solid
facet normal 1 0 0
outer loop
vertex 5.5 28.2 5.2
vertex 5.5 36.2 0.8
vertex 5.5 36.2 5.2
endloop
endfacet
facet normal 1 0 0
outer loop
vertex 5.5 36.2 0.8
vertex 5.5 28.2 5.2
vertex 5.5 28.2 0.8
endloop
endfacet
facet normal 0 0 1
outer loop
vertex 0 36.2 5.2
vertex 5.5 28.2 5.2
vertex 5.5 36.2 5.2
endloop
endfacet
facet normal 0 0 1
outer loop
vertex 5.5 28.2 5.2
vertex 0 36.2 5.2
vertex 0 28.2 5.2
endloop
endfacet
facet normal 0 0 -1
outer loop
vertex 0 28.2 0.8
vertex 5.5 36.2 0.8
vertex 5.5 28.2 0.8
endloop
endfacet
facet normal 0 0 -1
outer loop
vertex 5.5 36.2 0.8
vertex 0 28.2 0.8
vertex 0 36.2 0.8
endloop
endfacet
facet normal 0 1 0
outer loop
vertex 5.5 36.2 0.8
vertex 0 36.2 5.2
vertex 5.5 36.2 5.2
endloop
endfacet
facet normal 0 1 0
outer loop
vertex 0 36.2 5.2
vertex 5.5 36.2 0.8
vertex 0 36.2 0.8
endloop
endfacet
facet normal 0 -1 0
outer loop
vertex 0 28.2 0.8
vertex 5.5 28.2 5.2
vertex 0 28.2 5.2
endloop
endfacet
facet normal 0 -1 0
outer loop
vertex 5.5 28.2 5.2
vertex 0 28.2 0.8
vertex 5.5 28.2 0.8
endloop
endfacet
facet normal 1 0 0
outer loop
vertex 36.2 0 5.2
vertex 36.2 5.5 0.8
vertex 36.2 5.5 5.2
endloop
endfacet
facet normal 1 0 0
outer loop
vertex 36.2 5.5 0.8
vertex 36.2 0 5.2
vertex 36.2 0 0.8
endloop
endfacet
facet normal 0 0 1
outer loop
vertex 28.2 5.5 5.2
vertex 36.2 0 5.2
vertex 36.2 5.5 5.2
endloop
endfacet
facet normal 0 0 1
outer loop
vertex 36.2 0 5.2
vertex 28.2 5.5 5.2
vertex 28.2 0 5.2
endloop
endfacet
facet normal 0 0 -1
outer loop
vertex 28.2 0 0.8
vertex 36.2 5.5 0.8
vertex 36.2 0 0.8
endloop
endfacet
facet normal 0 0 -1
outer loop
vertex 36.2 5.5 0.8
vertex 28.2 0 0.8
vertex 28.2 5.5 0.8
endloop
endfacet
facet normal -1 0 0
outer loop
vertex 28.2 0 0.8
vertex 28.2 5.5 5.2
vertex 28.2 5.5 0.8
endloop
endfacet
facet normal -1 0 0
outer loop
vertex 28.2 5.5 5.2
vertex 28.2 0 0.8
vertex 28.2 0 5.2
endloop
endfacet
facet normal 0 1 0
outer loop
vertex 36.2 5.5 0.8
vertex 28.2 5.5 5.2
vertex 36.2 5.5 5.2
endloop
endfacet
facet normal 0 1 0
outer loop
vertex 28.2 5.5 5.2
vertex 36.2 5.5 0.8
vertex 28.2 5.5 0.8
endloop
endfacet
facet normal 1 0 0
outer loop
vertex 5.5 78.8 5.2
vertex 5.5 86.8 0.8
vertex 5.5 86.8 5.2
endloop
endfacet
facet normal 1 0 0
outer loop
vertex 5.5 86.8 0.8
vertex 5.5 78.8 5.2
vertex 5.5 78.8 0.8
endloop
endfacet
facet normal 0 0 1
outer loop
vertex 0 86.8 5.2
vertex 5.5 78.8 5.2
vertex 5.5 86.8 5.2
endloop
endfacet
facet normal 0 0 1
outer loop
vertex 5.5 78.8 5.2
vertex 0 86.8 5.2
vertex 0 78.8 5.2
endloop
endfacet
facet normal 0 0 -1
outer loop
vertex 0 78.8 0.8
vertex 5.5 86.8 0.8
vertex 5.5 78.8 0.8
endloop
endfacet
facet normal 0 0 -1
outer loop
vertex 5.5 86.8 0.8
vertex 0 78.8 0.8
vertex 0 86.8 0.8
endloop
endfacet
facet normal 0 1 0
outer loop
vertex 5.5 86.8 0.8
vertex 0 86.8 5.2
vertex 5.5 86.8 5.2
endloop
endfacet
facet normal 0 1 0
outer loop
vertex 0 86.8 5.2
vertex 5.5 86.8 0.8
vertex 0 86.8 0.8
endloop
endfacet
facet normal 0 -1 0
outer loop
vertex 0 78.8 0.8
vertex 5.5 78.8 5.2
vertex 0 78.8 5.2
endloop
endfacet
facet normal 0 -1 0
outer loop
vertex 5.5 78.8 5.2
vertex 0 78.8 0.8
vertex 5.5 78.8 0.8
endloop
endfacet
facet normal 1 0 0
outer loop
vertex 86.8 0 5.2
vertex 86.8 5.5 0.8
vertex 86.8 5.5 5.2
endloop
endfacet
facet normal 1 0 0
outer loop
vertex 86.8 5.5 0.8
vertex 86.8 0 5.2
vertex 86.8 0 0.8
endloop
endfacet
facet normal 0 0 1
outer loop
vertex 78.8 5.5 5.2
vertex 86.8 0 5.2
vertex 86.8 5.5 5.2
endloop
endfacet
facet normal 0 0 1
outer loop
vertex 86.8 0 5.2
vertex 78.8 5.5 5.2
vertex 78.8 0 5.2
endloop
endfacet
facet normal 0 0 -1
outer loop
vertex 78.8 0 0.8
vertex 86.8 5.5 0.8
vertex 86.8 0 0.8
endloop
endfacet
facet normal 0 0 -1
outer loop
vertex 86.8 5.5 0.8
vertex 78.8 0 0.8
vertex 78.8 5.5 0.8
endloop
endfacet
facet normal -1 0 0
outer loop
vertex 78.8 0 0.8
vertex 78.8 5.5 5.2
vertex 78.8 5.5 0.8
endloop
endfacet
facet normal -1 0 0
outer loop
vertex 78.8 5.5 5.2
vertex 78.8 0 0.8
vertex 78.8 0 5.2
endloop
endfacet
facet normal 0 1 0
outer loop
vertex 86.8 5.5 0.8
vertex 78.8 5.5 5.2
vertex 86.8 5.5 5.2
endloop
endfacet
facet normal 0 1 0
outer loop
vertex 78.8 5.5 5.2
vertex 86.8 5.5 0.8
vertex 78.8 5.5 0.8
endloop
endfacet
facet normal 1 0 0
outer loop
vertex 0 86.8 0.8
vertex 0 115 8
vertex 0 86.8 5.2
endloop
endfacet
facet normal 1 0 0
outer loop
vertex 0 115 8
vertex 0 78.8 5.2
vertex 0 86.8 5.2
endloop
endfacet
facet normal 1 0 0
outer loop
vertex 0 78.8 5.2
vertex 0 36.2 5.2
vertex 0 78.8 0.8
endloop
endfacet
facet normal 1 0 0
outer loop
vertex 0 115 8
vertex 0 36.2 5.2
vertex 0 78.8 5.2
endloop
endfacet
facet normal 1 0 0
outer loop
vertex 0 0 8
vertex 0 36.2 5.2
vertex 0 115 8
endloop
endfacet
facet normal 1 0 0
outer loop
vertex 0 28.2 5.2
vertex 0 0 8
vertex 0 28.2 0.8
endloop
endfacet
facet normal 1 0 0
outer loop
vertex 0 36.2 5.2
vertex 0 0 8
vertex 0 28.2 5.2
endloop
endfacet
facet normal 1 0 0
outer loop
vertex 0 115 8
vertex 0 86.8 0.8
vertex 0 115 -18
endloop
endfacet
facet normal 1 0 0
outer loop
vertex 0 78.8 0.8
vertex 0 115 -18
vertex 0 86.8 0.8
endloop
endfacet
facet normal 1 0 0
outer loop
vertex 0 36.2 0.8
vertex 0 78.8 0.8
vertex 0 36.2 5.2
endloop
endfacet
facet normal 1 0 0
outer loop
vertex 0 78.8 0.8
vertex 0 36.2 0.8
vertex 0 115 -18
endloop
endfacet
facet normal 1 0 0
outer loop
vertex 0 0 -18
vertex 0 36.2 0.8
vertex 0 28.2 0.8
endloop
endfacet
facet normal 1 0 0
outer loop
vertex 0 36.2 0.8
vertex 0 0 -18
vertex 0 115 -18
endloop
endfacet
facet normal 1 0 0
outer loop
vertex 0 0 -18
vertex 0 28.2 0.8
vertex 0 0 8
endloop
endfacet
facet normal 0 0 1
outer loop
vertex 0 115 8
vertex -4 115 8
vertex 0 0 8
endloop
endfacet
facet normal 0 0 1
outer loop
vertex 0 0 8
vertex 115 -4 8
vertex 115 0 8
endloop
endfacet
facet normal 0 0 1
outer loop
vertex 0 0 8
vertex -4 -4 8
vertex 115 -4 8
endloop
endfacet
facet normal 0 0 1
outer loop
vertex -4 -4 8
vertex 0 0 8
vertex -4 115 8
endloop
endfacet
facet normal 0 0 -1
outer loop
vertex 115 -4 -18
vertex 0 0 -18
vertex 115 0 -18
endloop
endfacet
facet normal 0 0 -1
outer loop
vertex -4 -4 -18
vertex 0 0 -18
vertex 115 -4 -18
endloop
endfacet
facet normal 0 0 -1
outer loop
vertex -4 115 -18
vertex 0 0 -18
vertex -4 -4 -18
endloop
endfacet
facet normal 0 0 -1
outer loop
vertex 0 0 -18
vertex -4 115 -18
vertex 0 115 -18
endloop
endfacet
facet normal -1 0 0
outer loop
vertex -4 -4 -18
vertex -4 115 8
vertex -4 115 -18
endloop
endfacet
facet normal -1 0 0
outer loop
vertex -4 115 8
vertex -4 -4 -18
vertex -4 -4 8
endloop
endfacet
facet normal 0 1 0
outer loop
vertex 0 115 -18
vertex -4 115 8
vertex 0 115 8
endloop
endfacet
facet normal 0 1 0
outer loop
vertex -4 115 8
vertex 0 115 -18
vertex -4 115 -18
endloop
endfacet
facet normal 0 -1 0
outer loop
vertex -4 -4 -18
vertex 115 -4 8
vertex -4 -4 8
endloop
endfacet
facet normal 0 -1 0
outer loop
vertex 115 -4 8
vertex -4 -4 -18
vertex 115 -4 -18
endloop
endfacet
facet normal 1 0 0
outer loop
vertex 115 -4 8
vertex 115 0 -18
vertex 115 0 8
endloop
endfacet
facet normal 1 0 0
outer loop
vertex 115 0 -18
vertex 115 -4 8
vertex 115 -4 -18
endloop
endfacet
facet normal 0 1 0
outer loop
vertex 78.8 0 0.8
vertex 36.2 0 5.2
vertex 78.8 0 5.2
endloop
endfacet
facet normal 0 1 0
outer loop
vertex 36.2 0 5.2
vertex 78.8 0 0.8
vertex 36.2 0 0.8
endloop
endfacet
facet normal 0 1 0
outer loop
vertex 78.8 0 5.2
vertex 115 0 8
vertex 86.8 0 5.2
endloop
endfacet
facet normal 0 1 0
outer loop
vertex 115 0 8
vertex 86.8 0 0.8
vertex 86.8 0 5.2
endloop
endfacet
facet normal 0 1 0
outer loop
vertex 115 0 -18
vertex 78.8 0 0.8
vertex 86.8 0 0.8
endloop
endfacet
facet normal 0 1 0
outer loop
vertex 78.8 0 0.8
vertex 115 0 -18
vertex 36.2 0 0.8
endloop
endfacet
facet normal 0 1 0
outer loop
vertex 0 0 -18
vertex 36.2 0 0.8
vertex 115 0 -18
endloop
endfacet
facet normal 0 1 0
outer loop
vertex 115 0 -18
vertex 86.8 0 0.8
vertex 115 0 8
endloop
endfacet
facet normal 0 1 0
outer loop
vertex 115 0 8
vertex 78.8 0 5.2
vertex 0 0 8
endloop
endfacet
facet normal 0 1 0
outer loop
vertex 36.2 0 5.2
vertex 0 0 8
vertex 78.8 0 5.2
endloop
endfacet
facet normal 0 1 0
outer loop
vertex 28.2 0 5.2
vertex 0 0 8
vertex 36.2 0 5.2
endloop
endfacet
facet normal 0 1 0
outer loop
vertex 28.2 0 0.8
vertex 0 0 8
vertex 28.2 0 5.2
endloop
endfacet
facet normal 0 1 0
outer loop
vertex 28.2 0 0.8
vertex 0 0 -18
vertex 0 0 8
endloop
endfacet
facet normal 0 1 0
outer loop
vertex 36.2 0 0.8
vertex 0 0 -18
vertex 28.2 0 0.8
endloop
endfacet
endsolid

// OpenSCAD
// file: params.scad
// V3 shared customizer settings. Dimensions are millimetres.

// Board hole pattern
hole_d = 10;             // [3:0.1:30] Finished hole / twist-bit diameter
grid_pitch = 50;         // [15:0.1:100] Centre-to-centre hole spacing
edge_offset = 25;        // [0:0.1:100] First hole centre from both board edges
board_cols = 10;         // [1:1:100] Number of holes across the board
board_rows = 10;         // [1:1:100] Number of holes down the board
panel_t = 18;            // [3:0.1:50] Board thickness

// A1 mini print envelope
build_x = 180;
build_y = 180;
bed_edge_clearance = 3;  // Keep the part this far from each bed edge

// Twist-drill guide and bushing
bush_od = 12;            // Metal guide bush outside diameter
bush_id = 10;            // Metal guide bush inside diameter; match the bit
bush_seat_d = 11.9;      // Printed press-fit socket; tune with a test coupon
bush_seat_h = 8;
bit_clearance = 0.4;     // Clearance below the metal bush
pin_clearance = 0.2;     // Locating pin undersize relative to the drilled hole
bit_clear_d = hole_d + bit_clearance;

// Shared body dimensions
base_t = 6;
boss_wall = 4;            // Plastic wall around the bush seat
boss_d = max(max(bush_od, bush_seat_d), bit_clear_d) + 2 * boss_wall;
boss_h = 8;
rib_w = 8;
border_w = 8;
$fn = 48;
pin_len = 10;
pin_chamfer_h = 1.2;
pin_chamfer_radial = 0.6;
pin_mount_clearance = 0.25; // Bore allowance around each removable pin stem
pin_head_d = 14;
pin_head_h = 1.6;
pin_head_recess_clearance = 0.3;
pin_pad_d = 18;
pin_set_spacing = 18;

// The indexing tile keeps a 2x2 pin pattern and uses every remaining
// grid station as a drill guide. The default 4x4 tile gives 12 guides.
index_cols = 4;           // [3:1:8] Grid stations across the indexing tile
index_rows = 4;           // [3:1:8] Grid stations down the indexing tile

// Corner starter joint. The fence is a separate printable piece that mates
// with the plate; together they are the corner-starter tool.
clamp_hole_d = 6;
clamp_gap = 25;
edge_margin = 15;
fence_t = 4;
fence_top = 8;
notch_d = 6;
notch_w = 10;
tab_d = 5.5;
tab_w = 8;
tab_t = 4.4;
tab_z = 0.8;
tab_fractions = [0.28, 0.72];

// Derived dimensions and point lists
pin_d = hole_d - pin_clearance;
pin_mount_d = pin_d + pin_mount_clearance;
pin_head_recess_d = pin_head_d + pin_head_recess_clearance;
seed_x = [edge_offset, edge_offset + grid_pitch];
seed_y = [edge_offset, edge_offset + grid_pitch];
seed_points = [for (x = seed_x, y = seed_y) [x, y]];
index_pin_points = [[0, 0], [grid_pitch, 0], [0, grid_pitch], [grid_pitch, grid_pitch]];
index_guide_points = [
    for (ix = [0 : index_cols - 1], iy = [0 : index_rows - 1])
        if (!(ix < 2 && iy < 2)) [ix * grid_pitch, iy * grid_pitch]
];
index_x0 = -boss_d / 2;
index_y0 = -boss_d / 2;
index_x1 = (index_cols - 1) * grid_pitch + boss_d / 2;
index_y1 = (index_rows - 1) * grid_pitch + boss_d / 2;
index_size_x = index_x1 - index_x0;
index_size_y = index_y1 - index_y0;
index_guide_count = len(index_guide_points);

starter_last_x = edge_offset + grid_pitch;
starter_last_y = edge_offset + grid_pitch;
starter_clamp_x = starter_last_x + clamp_gap;
starter_clamp_y = starter_last_y + clamp_gap;
starter_reach = max(starter_clamp_x, starter_clamp_y) + edge_margin;
starter_tab_positions = [for (f = tab_fractions) f * starter_reach];

assert(hole_d > pin_clearance, "Hole diameter must exceed pin clearance.");
assert(pin_mount_d > pin_d, "Pin mounting bore must allow a printable fit.");
assert(pin_head_recess_d < pin_pad_d, "Pin-head pocket needs material around it.");
assert(bush_id >= hole_d, "Choose a guide bush ID that fits the selected drill bit.");
assert(bush_seat_d > bush_id, "Bush seat must be larger than the bush bore.");
assert(bush_seat_d < bush_od + 0.6, "Bush seat fit is unusually loose; check the bush OD.");
assert(boss_h >= bush_seat_h, "Bush seat cannot be deeper than the guide boss.");
assert(grid_pitch >= boss_d + 2, "Grid pitch is too tight for the guide bosses.");
assert(index_cols >= 3 && index_rows >= 3, "Indexing tile needs at least 3x3 stations.");
assert(index_size_x <= build_x - 2 * bed_edge_clearance,
       str("Indexing tile is too wide for the selected bed: ", index_size_x, " mm."));
assert(index_size_y <= build_y - 2 * bed_edge_clearance,
       str("Indexing tile is too deep for the selected bed: ", index_size_y, " mm."));
assert(starter_reach <= build_x && starter_reach <= build_y,
       "Corner starter plate exceeds the selected printer bed.");
assert(board_cols >= 2 && board_rows >= 2, "Board must have at least a 2x2 hole grid.");
// main file
// V3 CORNER STARTER FENCE
// The two walls register against the outside faces of the board corner.
// Print with the long wall bottom edges on the bed; use a brim if needed.
include <params.scad>

module corner_starter_fence() {
    union() {
        // L-shaped fence walls span from below the panel top to a short lip above it.
        translate([-fence_t, -fence_t, -panel_t])
            cube([fence_t, starter_reach + fence_t, panel_t + fence_top]);
        translate([-fence_t, -fence_t, -panel_t])
            cube([starter_reach + fence_t, fence_t, panel_t + fence_top]);

        // Tabs fit into the pockets in corner_starter_plate.scad.
        for (c = starter_tab_positions) {
            translate([-0.01, c - tab_w / 2, tab_z])
                cube([tab_d + 0.01, tab_w, tab_t]);
            translate([c - tab_w / 2, -0.01, tab_z])
                cube([tab_w, tab_d + 0.01, tab_t]);
        }
    }
}

corner_starter_fence();
